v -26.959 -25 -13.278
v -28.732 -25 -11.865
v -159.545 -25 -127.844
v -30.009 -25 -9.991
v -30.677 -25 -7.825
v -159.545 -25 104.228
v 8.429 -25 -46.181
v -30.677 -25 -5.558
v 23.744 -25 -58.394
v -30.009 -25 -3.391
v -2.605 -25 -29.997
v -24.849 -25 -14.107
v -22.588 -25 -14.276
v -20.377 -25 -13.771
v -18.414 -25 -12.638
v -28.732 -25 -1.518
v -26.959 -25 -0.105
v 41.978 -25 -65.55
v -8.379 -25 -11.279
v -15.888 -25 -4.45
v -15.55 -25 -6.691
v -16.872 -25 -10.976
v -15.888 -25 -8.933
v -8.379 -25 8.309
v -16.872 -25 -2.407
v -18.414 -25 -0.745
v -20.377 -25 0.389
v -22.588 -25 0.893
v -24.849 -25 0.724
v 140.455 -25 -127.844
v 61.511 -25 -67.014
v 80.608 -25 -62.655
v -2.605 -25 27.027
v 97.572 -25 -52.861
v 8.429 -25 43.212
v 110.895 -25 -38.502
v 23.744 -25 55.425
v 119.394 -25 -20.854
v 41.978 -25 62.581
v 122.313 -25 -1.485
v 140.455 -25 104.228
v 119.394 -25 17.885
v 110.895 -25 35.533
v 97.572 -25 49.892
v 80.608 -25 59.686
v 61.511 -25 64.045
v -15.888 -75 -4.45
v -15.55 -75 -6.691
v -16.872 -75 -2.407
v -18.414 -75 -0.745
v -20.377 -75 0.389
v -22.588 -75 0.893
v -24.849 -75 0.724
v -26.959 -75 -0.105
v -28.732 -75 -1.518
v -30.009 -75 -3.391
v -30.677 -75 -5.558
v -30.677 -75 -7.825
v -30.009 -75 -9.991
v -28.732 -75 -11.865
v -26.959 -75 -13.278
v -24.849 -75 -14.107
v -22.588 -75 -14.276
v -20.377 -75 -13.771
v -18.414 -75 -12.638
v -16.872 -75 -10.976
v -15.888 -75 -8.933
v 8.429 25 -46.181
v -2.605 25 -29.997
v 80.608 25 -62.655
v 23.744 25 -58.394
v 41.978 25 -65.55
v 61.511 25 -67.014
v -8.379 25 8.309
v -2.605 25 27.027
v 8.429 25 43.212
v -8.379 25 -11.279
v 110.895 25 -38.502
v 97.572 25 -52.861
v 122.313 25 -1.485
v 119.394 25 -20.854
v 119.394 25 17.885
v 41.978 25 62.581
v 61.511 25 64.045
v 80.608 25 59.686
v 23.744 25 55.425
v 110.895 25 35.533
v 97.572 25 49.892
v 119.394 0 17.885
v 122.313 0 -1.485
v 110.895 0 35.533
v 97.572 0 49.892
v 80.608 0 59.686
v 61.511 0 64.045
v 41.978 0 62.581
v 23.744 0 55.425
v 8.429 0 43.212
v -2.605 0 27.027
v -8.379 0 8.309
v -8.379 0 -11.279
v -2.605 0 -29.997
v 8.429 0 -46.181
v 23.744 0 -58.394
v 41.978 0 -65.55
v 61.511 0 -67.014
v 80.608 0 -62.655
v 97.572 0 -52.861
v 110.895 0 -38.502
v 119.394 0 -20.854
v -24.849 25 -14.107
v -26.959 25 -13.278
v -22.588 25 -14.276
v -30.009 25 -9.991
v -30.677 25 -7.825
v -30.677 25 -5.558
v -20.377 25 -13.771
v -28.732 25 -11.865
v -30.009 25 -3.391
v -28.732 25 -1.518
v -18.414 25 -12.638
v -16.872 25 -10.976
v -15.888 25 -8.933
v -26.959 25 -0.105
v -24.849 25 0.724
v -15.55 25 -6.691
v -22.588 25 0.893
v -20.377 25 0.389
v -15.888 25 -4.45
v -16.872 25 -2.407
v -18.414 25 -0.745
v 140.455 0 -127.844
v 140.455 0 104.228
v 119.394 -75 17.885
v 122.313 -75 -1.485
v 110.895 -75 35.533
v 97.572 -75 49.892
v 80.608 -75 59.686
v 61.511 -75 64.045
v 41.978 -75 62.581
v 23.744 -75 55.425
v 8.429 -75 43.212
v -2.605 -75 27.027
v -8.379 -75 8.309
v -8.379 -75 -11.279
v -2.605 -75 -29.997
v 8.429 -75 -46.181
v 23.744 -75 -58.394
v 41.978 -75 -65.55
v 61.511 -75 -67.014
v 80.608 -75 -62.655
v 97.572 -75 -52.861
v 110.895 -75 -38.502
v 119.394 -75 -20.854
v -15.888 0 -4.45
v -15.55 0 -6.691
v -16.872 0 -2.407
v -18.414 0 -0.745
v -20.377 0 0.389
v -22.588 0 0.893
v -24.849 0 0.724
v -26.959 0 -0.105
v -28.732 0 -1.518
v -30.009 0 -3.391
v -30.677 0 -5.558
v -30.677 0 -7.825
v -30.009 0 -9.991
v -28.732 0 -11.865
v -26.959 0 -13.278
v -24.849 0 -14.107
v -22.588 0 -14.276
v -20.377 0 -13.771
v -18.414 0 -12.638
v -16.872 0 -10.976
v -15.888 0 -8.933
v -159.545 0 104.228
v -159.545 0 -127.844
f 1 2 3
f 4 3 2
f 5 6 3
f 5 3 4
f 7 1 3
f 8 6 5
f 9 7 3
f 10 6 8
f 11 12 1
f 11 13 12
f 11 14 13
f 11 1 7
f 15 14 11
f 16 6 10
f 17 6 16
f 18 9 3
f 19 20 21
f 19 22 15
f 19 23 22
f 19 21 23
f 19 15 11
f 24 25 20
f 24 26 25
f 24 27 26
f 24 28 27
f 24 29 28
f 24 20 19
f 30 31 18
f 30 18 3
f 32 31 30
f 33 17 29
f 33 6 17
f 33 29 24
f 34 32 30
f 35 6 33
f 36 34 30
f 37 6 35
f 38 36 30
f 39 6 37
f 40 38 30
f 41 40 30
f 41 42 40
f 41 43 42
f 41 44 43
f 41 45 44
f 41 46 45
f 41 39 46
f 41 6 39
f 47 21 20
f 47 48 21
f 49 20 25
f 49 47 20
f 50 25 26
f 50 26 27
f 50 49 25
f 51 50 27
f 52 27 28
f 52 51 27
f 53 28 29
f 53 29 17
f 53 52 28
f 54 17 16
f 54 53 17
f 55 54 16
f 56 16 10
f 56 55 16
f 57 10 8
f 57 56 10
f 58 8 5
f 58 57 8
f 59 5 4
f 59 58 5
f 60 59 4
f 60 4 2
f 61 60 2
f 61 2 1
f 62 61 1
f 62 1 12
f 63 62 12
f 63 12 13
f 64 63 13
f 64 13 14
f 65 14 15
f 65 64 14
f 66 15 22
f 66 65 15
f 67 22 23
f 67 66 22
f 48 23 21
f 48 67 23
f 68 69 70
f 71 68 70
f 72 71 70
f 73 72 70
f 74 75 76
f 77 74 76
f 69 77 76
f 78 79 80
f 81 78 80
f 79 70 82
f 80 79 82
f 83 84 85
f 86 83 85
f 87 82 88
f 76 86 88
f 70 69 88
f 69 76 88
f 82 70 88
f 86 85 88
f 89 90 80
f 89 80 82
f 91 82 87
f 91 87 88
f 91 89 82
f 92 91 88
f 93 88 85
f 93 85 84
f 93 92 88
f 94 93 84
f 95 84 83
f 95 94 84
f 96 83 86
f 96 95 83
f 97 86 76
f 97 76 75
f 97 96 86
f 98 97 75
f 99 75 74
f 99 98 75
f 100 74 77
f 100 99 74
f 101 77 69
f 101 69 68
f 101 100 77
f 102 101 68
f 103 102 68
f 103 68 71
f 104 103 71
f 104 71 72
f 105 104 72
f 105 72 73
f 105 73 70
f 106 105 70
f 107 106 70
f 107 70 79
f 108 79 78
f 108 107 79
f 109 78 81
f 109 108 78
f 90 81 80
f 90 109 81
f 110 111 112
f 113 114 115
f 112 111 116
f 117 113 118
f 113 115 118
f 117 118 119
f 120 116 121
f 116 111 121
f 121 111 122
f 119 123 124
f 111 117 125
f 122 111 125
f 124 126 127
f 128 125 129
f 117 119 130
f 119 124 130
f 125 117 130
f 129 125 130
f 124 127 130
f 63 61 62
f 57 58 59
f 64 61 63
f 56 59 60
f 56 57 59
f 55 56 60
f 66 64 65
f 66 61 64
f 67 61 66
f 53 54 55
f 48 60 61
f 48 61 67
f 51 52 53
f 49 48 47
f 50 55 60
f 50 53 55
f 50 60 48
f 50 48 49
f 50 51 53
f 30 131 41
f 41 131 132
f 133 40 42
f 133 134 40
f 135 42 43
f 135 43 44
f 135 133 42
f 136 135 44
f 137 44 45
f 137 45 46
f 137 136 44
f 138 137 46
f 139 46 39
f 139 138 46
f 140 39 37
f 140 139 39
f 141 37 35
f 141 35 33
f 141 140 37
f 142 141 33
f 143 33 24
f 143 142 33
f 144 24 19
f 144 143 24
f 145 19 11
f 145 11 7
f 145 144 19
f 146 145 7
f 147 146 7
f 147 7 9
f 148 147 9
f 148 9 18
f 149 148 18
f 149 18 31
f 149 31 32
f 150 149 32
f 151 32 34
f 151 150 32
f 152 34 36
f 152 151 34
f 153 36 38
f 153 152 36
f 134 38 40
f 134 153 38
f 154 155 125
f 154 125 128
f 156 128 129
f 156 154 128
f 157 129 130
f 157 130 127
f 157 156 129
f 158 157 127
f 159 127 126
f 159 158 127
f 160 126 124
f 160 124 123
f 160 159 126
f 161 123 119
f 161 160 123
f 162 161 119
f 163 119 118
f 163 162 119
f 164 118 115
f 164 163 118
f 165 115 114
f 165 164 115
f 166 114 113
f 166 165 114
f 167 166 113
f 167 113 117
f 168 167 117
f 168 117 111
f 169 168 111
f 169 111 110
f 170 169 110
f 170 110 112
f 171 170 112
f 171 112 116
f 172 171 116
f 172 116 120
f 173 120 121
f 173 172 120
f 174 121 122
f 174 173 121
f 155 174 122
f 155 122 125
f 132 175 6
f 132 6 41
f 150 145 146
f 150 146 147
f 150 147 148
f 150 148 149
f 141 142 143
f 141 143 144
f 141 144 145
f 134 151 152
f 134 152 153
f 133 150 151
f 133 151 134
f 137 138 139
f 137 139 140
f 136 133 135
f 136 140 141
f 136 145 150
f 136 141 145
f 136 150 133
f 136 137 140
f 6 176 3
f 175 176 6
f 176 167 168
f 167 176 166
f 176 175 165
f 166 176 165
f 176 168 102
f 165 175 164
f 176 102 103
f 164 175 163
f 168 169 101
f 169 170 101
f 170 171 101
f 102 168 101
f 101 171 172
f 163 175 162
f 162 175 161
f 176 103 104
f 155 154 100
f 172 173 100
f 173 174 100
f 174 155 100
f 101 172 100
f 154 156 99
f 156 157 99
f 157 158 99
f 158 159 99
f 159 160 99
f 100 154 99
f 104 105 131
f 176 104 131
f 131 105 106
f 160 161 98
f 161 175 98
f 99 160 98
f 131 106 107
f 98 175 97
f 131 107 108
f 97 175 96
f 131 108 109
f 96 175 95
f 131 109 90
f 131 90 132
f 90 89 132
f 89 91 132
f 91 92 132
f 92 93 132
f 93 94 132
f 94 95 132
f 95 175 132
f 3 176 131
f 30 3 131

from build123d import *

# Parameters (mm, degrees)
F0_W     = 300
F0_H     = 232.072148
F1_DEPTH = 25
F2_R     = 7.605799
F3_DEPTH = 50
F4_R     = 65.713133
F5_DEPTH = 50


with BuildPart() as f1:
    # F0 (on Front) → F1 (new body)
    with BuildSketch(Plane.XZ):
        with Locations((-9.545375, -11.807603)):
            Rectangle(F0_W, F0_H)
    extrude(amount=F1_DEPTH)

    # F2 (on face) → F3 (join, symmetric)
    with BuildSketch(Plane.XZ.offset(25)):
        with Locations((-23.156079, -6.691449)):
            Circle(F2_R)
    extrude(amount=F3_DEPTH, both=True)

    # F4 (on face) → F5 (join, symmetric)
    with BuildSketch(Plane.XZ.offset(25)):
        with Locations((56.600176, -1.484662)):
            Circle(F4_R)
    extrude(amount=F5_DEPTH, both=True)


solid = f1.part
